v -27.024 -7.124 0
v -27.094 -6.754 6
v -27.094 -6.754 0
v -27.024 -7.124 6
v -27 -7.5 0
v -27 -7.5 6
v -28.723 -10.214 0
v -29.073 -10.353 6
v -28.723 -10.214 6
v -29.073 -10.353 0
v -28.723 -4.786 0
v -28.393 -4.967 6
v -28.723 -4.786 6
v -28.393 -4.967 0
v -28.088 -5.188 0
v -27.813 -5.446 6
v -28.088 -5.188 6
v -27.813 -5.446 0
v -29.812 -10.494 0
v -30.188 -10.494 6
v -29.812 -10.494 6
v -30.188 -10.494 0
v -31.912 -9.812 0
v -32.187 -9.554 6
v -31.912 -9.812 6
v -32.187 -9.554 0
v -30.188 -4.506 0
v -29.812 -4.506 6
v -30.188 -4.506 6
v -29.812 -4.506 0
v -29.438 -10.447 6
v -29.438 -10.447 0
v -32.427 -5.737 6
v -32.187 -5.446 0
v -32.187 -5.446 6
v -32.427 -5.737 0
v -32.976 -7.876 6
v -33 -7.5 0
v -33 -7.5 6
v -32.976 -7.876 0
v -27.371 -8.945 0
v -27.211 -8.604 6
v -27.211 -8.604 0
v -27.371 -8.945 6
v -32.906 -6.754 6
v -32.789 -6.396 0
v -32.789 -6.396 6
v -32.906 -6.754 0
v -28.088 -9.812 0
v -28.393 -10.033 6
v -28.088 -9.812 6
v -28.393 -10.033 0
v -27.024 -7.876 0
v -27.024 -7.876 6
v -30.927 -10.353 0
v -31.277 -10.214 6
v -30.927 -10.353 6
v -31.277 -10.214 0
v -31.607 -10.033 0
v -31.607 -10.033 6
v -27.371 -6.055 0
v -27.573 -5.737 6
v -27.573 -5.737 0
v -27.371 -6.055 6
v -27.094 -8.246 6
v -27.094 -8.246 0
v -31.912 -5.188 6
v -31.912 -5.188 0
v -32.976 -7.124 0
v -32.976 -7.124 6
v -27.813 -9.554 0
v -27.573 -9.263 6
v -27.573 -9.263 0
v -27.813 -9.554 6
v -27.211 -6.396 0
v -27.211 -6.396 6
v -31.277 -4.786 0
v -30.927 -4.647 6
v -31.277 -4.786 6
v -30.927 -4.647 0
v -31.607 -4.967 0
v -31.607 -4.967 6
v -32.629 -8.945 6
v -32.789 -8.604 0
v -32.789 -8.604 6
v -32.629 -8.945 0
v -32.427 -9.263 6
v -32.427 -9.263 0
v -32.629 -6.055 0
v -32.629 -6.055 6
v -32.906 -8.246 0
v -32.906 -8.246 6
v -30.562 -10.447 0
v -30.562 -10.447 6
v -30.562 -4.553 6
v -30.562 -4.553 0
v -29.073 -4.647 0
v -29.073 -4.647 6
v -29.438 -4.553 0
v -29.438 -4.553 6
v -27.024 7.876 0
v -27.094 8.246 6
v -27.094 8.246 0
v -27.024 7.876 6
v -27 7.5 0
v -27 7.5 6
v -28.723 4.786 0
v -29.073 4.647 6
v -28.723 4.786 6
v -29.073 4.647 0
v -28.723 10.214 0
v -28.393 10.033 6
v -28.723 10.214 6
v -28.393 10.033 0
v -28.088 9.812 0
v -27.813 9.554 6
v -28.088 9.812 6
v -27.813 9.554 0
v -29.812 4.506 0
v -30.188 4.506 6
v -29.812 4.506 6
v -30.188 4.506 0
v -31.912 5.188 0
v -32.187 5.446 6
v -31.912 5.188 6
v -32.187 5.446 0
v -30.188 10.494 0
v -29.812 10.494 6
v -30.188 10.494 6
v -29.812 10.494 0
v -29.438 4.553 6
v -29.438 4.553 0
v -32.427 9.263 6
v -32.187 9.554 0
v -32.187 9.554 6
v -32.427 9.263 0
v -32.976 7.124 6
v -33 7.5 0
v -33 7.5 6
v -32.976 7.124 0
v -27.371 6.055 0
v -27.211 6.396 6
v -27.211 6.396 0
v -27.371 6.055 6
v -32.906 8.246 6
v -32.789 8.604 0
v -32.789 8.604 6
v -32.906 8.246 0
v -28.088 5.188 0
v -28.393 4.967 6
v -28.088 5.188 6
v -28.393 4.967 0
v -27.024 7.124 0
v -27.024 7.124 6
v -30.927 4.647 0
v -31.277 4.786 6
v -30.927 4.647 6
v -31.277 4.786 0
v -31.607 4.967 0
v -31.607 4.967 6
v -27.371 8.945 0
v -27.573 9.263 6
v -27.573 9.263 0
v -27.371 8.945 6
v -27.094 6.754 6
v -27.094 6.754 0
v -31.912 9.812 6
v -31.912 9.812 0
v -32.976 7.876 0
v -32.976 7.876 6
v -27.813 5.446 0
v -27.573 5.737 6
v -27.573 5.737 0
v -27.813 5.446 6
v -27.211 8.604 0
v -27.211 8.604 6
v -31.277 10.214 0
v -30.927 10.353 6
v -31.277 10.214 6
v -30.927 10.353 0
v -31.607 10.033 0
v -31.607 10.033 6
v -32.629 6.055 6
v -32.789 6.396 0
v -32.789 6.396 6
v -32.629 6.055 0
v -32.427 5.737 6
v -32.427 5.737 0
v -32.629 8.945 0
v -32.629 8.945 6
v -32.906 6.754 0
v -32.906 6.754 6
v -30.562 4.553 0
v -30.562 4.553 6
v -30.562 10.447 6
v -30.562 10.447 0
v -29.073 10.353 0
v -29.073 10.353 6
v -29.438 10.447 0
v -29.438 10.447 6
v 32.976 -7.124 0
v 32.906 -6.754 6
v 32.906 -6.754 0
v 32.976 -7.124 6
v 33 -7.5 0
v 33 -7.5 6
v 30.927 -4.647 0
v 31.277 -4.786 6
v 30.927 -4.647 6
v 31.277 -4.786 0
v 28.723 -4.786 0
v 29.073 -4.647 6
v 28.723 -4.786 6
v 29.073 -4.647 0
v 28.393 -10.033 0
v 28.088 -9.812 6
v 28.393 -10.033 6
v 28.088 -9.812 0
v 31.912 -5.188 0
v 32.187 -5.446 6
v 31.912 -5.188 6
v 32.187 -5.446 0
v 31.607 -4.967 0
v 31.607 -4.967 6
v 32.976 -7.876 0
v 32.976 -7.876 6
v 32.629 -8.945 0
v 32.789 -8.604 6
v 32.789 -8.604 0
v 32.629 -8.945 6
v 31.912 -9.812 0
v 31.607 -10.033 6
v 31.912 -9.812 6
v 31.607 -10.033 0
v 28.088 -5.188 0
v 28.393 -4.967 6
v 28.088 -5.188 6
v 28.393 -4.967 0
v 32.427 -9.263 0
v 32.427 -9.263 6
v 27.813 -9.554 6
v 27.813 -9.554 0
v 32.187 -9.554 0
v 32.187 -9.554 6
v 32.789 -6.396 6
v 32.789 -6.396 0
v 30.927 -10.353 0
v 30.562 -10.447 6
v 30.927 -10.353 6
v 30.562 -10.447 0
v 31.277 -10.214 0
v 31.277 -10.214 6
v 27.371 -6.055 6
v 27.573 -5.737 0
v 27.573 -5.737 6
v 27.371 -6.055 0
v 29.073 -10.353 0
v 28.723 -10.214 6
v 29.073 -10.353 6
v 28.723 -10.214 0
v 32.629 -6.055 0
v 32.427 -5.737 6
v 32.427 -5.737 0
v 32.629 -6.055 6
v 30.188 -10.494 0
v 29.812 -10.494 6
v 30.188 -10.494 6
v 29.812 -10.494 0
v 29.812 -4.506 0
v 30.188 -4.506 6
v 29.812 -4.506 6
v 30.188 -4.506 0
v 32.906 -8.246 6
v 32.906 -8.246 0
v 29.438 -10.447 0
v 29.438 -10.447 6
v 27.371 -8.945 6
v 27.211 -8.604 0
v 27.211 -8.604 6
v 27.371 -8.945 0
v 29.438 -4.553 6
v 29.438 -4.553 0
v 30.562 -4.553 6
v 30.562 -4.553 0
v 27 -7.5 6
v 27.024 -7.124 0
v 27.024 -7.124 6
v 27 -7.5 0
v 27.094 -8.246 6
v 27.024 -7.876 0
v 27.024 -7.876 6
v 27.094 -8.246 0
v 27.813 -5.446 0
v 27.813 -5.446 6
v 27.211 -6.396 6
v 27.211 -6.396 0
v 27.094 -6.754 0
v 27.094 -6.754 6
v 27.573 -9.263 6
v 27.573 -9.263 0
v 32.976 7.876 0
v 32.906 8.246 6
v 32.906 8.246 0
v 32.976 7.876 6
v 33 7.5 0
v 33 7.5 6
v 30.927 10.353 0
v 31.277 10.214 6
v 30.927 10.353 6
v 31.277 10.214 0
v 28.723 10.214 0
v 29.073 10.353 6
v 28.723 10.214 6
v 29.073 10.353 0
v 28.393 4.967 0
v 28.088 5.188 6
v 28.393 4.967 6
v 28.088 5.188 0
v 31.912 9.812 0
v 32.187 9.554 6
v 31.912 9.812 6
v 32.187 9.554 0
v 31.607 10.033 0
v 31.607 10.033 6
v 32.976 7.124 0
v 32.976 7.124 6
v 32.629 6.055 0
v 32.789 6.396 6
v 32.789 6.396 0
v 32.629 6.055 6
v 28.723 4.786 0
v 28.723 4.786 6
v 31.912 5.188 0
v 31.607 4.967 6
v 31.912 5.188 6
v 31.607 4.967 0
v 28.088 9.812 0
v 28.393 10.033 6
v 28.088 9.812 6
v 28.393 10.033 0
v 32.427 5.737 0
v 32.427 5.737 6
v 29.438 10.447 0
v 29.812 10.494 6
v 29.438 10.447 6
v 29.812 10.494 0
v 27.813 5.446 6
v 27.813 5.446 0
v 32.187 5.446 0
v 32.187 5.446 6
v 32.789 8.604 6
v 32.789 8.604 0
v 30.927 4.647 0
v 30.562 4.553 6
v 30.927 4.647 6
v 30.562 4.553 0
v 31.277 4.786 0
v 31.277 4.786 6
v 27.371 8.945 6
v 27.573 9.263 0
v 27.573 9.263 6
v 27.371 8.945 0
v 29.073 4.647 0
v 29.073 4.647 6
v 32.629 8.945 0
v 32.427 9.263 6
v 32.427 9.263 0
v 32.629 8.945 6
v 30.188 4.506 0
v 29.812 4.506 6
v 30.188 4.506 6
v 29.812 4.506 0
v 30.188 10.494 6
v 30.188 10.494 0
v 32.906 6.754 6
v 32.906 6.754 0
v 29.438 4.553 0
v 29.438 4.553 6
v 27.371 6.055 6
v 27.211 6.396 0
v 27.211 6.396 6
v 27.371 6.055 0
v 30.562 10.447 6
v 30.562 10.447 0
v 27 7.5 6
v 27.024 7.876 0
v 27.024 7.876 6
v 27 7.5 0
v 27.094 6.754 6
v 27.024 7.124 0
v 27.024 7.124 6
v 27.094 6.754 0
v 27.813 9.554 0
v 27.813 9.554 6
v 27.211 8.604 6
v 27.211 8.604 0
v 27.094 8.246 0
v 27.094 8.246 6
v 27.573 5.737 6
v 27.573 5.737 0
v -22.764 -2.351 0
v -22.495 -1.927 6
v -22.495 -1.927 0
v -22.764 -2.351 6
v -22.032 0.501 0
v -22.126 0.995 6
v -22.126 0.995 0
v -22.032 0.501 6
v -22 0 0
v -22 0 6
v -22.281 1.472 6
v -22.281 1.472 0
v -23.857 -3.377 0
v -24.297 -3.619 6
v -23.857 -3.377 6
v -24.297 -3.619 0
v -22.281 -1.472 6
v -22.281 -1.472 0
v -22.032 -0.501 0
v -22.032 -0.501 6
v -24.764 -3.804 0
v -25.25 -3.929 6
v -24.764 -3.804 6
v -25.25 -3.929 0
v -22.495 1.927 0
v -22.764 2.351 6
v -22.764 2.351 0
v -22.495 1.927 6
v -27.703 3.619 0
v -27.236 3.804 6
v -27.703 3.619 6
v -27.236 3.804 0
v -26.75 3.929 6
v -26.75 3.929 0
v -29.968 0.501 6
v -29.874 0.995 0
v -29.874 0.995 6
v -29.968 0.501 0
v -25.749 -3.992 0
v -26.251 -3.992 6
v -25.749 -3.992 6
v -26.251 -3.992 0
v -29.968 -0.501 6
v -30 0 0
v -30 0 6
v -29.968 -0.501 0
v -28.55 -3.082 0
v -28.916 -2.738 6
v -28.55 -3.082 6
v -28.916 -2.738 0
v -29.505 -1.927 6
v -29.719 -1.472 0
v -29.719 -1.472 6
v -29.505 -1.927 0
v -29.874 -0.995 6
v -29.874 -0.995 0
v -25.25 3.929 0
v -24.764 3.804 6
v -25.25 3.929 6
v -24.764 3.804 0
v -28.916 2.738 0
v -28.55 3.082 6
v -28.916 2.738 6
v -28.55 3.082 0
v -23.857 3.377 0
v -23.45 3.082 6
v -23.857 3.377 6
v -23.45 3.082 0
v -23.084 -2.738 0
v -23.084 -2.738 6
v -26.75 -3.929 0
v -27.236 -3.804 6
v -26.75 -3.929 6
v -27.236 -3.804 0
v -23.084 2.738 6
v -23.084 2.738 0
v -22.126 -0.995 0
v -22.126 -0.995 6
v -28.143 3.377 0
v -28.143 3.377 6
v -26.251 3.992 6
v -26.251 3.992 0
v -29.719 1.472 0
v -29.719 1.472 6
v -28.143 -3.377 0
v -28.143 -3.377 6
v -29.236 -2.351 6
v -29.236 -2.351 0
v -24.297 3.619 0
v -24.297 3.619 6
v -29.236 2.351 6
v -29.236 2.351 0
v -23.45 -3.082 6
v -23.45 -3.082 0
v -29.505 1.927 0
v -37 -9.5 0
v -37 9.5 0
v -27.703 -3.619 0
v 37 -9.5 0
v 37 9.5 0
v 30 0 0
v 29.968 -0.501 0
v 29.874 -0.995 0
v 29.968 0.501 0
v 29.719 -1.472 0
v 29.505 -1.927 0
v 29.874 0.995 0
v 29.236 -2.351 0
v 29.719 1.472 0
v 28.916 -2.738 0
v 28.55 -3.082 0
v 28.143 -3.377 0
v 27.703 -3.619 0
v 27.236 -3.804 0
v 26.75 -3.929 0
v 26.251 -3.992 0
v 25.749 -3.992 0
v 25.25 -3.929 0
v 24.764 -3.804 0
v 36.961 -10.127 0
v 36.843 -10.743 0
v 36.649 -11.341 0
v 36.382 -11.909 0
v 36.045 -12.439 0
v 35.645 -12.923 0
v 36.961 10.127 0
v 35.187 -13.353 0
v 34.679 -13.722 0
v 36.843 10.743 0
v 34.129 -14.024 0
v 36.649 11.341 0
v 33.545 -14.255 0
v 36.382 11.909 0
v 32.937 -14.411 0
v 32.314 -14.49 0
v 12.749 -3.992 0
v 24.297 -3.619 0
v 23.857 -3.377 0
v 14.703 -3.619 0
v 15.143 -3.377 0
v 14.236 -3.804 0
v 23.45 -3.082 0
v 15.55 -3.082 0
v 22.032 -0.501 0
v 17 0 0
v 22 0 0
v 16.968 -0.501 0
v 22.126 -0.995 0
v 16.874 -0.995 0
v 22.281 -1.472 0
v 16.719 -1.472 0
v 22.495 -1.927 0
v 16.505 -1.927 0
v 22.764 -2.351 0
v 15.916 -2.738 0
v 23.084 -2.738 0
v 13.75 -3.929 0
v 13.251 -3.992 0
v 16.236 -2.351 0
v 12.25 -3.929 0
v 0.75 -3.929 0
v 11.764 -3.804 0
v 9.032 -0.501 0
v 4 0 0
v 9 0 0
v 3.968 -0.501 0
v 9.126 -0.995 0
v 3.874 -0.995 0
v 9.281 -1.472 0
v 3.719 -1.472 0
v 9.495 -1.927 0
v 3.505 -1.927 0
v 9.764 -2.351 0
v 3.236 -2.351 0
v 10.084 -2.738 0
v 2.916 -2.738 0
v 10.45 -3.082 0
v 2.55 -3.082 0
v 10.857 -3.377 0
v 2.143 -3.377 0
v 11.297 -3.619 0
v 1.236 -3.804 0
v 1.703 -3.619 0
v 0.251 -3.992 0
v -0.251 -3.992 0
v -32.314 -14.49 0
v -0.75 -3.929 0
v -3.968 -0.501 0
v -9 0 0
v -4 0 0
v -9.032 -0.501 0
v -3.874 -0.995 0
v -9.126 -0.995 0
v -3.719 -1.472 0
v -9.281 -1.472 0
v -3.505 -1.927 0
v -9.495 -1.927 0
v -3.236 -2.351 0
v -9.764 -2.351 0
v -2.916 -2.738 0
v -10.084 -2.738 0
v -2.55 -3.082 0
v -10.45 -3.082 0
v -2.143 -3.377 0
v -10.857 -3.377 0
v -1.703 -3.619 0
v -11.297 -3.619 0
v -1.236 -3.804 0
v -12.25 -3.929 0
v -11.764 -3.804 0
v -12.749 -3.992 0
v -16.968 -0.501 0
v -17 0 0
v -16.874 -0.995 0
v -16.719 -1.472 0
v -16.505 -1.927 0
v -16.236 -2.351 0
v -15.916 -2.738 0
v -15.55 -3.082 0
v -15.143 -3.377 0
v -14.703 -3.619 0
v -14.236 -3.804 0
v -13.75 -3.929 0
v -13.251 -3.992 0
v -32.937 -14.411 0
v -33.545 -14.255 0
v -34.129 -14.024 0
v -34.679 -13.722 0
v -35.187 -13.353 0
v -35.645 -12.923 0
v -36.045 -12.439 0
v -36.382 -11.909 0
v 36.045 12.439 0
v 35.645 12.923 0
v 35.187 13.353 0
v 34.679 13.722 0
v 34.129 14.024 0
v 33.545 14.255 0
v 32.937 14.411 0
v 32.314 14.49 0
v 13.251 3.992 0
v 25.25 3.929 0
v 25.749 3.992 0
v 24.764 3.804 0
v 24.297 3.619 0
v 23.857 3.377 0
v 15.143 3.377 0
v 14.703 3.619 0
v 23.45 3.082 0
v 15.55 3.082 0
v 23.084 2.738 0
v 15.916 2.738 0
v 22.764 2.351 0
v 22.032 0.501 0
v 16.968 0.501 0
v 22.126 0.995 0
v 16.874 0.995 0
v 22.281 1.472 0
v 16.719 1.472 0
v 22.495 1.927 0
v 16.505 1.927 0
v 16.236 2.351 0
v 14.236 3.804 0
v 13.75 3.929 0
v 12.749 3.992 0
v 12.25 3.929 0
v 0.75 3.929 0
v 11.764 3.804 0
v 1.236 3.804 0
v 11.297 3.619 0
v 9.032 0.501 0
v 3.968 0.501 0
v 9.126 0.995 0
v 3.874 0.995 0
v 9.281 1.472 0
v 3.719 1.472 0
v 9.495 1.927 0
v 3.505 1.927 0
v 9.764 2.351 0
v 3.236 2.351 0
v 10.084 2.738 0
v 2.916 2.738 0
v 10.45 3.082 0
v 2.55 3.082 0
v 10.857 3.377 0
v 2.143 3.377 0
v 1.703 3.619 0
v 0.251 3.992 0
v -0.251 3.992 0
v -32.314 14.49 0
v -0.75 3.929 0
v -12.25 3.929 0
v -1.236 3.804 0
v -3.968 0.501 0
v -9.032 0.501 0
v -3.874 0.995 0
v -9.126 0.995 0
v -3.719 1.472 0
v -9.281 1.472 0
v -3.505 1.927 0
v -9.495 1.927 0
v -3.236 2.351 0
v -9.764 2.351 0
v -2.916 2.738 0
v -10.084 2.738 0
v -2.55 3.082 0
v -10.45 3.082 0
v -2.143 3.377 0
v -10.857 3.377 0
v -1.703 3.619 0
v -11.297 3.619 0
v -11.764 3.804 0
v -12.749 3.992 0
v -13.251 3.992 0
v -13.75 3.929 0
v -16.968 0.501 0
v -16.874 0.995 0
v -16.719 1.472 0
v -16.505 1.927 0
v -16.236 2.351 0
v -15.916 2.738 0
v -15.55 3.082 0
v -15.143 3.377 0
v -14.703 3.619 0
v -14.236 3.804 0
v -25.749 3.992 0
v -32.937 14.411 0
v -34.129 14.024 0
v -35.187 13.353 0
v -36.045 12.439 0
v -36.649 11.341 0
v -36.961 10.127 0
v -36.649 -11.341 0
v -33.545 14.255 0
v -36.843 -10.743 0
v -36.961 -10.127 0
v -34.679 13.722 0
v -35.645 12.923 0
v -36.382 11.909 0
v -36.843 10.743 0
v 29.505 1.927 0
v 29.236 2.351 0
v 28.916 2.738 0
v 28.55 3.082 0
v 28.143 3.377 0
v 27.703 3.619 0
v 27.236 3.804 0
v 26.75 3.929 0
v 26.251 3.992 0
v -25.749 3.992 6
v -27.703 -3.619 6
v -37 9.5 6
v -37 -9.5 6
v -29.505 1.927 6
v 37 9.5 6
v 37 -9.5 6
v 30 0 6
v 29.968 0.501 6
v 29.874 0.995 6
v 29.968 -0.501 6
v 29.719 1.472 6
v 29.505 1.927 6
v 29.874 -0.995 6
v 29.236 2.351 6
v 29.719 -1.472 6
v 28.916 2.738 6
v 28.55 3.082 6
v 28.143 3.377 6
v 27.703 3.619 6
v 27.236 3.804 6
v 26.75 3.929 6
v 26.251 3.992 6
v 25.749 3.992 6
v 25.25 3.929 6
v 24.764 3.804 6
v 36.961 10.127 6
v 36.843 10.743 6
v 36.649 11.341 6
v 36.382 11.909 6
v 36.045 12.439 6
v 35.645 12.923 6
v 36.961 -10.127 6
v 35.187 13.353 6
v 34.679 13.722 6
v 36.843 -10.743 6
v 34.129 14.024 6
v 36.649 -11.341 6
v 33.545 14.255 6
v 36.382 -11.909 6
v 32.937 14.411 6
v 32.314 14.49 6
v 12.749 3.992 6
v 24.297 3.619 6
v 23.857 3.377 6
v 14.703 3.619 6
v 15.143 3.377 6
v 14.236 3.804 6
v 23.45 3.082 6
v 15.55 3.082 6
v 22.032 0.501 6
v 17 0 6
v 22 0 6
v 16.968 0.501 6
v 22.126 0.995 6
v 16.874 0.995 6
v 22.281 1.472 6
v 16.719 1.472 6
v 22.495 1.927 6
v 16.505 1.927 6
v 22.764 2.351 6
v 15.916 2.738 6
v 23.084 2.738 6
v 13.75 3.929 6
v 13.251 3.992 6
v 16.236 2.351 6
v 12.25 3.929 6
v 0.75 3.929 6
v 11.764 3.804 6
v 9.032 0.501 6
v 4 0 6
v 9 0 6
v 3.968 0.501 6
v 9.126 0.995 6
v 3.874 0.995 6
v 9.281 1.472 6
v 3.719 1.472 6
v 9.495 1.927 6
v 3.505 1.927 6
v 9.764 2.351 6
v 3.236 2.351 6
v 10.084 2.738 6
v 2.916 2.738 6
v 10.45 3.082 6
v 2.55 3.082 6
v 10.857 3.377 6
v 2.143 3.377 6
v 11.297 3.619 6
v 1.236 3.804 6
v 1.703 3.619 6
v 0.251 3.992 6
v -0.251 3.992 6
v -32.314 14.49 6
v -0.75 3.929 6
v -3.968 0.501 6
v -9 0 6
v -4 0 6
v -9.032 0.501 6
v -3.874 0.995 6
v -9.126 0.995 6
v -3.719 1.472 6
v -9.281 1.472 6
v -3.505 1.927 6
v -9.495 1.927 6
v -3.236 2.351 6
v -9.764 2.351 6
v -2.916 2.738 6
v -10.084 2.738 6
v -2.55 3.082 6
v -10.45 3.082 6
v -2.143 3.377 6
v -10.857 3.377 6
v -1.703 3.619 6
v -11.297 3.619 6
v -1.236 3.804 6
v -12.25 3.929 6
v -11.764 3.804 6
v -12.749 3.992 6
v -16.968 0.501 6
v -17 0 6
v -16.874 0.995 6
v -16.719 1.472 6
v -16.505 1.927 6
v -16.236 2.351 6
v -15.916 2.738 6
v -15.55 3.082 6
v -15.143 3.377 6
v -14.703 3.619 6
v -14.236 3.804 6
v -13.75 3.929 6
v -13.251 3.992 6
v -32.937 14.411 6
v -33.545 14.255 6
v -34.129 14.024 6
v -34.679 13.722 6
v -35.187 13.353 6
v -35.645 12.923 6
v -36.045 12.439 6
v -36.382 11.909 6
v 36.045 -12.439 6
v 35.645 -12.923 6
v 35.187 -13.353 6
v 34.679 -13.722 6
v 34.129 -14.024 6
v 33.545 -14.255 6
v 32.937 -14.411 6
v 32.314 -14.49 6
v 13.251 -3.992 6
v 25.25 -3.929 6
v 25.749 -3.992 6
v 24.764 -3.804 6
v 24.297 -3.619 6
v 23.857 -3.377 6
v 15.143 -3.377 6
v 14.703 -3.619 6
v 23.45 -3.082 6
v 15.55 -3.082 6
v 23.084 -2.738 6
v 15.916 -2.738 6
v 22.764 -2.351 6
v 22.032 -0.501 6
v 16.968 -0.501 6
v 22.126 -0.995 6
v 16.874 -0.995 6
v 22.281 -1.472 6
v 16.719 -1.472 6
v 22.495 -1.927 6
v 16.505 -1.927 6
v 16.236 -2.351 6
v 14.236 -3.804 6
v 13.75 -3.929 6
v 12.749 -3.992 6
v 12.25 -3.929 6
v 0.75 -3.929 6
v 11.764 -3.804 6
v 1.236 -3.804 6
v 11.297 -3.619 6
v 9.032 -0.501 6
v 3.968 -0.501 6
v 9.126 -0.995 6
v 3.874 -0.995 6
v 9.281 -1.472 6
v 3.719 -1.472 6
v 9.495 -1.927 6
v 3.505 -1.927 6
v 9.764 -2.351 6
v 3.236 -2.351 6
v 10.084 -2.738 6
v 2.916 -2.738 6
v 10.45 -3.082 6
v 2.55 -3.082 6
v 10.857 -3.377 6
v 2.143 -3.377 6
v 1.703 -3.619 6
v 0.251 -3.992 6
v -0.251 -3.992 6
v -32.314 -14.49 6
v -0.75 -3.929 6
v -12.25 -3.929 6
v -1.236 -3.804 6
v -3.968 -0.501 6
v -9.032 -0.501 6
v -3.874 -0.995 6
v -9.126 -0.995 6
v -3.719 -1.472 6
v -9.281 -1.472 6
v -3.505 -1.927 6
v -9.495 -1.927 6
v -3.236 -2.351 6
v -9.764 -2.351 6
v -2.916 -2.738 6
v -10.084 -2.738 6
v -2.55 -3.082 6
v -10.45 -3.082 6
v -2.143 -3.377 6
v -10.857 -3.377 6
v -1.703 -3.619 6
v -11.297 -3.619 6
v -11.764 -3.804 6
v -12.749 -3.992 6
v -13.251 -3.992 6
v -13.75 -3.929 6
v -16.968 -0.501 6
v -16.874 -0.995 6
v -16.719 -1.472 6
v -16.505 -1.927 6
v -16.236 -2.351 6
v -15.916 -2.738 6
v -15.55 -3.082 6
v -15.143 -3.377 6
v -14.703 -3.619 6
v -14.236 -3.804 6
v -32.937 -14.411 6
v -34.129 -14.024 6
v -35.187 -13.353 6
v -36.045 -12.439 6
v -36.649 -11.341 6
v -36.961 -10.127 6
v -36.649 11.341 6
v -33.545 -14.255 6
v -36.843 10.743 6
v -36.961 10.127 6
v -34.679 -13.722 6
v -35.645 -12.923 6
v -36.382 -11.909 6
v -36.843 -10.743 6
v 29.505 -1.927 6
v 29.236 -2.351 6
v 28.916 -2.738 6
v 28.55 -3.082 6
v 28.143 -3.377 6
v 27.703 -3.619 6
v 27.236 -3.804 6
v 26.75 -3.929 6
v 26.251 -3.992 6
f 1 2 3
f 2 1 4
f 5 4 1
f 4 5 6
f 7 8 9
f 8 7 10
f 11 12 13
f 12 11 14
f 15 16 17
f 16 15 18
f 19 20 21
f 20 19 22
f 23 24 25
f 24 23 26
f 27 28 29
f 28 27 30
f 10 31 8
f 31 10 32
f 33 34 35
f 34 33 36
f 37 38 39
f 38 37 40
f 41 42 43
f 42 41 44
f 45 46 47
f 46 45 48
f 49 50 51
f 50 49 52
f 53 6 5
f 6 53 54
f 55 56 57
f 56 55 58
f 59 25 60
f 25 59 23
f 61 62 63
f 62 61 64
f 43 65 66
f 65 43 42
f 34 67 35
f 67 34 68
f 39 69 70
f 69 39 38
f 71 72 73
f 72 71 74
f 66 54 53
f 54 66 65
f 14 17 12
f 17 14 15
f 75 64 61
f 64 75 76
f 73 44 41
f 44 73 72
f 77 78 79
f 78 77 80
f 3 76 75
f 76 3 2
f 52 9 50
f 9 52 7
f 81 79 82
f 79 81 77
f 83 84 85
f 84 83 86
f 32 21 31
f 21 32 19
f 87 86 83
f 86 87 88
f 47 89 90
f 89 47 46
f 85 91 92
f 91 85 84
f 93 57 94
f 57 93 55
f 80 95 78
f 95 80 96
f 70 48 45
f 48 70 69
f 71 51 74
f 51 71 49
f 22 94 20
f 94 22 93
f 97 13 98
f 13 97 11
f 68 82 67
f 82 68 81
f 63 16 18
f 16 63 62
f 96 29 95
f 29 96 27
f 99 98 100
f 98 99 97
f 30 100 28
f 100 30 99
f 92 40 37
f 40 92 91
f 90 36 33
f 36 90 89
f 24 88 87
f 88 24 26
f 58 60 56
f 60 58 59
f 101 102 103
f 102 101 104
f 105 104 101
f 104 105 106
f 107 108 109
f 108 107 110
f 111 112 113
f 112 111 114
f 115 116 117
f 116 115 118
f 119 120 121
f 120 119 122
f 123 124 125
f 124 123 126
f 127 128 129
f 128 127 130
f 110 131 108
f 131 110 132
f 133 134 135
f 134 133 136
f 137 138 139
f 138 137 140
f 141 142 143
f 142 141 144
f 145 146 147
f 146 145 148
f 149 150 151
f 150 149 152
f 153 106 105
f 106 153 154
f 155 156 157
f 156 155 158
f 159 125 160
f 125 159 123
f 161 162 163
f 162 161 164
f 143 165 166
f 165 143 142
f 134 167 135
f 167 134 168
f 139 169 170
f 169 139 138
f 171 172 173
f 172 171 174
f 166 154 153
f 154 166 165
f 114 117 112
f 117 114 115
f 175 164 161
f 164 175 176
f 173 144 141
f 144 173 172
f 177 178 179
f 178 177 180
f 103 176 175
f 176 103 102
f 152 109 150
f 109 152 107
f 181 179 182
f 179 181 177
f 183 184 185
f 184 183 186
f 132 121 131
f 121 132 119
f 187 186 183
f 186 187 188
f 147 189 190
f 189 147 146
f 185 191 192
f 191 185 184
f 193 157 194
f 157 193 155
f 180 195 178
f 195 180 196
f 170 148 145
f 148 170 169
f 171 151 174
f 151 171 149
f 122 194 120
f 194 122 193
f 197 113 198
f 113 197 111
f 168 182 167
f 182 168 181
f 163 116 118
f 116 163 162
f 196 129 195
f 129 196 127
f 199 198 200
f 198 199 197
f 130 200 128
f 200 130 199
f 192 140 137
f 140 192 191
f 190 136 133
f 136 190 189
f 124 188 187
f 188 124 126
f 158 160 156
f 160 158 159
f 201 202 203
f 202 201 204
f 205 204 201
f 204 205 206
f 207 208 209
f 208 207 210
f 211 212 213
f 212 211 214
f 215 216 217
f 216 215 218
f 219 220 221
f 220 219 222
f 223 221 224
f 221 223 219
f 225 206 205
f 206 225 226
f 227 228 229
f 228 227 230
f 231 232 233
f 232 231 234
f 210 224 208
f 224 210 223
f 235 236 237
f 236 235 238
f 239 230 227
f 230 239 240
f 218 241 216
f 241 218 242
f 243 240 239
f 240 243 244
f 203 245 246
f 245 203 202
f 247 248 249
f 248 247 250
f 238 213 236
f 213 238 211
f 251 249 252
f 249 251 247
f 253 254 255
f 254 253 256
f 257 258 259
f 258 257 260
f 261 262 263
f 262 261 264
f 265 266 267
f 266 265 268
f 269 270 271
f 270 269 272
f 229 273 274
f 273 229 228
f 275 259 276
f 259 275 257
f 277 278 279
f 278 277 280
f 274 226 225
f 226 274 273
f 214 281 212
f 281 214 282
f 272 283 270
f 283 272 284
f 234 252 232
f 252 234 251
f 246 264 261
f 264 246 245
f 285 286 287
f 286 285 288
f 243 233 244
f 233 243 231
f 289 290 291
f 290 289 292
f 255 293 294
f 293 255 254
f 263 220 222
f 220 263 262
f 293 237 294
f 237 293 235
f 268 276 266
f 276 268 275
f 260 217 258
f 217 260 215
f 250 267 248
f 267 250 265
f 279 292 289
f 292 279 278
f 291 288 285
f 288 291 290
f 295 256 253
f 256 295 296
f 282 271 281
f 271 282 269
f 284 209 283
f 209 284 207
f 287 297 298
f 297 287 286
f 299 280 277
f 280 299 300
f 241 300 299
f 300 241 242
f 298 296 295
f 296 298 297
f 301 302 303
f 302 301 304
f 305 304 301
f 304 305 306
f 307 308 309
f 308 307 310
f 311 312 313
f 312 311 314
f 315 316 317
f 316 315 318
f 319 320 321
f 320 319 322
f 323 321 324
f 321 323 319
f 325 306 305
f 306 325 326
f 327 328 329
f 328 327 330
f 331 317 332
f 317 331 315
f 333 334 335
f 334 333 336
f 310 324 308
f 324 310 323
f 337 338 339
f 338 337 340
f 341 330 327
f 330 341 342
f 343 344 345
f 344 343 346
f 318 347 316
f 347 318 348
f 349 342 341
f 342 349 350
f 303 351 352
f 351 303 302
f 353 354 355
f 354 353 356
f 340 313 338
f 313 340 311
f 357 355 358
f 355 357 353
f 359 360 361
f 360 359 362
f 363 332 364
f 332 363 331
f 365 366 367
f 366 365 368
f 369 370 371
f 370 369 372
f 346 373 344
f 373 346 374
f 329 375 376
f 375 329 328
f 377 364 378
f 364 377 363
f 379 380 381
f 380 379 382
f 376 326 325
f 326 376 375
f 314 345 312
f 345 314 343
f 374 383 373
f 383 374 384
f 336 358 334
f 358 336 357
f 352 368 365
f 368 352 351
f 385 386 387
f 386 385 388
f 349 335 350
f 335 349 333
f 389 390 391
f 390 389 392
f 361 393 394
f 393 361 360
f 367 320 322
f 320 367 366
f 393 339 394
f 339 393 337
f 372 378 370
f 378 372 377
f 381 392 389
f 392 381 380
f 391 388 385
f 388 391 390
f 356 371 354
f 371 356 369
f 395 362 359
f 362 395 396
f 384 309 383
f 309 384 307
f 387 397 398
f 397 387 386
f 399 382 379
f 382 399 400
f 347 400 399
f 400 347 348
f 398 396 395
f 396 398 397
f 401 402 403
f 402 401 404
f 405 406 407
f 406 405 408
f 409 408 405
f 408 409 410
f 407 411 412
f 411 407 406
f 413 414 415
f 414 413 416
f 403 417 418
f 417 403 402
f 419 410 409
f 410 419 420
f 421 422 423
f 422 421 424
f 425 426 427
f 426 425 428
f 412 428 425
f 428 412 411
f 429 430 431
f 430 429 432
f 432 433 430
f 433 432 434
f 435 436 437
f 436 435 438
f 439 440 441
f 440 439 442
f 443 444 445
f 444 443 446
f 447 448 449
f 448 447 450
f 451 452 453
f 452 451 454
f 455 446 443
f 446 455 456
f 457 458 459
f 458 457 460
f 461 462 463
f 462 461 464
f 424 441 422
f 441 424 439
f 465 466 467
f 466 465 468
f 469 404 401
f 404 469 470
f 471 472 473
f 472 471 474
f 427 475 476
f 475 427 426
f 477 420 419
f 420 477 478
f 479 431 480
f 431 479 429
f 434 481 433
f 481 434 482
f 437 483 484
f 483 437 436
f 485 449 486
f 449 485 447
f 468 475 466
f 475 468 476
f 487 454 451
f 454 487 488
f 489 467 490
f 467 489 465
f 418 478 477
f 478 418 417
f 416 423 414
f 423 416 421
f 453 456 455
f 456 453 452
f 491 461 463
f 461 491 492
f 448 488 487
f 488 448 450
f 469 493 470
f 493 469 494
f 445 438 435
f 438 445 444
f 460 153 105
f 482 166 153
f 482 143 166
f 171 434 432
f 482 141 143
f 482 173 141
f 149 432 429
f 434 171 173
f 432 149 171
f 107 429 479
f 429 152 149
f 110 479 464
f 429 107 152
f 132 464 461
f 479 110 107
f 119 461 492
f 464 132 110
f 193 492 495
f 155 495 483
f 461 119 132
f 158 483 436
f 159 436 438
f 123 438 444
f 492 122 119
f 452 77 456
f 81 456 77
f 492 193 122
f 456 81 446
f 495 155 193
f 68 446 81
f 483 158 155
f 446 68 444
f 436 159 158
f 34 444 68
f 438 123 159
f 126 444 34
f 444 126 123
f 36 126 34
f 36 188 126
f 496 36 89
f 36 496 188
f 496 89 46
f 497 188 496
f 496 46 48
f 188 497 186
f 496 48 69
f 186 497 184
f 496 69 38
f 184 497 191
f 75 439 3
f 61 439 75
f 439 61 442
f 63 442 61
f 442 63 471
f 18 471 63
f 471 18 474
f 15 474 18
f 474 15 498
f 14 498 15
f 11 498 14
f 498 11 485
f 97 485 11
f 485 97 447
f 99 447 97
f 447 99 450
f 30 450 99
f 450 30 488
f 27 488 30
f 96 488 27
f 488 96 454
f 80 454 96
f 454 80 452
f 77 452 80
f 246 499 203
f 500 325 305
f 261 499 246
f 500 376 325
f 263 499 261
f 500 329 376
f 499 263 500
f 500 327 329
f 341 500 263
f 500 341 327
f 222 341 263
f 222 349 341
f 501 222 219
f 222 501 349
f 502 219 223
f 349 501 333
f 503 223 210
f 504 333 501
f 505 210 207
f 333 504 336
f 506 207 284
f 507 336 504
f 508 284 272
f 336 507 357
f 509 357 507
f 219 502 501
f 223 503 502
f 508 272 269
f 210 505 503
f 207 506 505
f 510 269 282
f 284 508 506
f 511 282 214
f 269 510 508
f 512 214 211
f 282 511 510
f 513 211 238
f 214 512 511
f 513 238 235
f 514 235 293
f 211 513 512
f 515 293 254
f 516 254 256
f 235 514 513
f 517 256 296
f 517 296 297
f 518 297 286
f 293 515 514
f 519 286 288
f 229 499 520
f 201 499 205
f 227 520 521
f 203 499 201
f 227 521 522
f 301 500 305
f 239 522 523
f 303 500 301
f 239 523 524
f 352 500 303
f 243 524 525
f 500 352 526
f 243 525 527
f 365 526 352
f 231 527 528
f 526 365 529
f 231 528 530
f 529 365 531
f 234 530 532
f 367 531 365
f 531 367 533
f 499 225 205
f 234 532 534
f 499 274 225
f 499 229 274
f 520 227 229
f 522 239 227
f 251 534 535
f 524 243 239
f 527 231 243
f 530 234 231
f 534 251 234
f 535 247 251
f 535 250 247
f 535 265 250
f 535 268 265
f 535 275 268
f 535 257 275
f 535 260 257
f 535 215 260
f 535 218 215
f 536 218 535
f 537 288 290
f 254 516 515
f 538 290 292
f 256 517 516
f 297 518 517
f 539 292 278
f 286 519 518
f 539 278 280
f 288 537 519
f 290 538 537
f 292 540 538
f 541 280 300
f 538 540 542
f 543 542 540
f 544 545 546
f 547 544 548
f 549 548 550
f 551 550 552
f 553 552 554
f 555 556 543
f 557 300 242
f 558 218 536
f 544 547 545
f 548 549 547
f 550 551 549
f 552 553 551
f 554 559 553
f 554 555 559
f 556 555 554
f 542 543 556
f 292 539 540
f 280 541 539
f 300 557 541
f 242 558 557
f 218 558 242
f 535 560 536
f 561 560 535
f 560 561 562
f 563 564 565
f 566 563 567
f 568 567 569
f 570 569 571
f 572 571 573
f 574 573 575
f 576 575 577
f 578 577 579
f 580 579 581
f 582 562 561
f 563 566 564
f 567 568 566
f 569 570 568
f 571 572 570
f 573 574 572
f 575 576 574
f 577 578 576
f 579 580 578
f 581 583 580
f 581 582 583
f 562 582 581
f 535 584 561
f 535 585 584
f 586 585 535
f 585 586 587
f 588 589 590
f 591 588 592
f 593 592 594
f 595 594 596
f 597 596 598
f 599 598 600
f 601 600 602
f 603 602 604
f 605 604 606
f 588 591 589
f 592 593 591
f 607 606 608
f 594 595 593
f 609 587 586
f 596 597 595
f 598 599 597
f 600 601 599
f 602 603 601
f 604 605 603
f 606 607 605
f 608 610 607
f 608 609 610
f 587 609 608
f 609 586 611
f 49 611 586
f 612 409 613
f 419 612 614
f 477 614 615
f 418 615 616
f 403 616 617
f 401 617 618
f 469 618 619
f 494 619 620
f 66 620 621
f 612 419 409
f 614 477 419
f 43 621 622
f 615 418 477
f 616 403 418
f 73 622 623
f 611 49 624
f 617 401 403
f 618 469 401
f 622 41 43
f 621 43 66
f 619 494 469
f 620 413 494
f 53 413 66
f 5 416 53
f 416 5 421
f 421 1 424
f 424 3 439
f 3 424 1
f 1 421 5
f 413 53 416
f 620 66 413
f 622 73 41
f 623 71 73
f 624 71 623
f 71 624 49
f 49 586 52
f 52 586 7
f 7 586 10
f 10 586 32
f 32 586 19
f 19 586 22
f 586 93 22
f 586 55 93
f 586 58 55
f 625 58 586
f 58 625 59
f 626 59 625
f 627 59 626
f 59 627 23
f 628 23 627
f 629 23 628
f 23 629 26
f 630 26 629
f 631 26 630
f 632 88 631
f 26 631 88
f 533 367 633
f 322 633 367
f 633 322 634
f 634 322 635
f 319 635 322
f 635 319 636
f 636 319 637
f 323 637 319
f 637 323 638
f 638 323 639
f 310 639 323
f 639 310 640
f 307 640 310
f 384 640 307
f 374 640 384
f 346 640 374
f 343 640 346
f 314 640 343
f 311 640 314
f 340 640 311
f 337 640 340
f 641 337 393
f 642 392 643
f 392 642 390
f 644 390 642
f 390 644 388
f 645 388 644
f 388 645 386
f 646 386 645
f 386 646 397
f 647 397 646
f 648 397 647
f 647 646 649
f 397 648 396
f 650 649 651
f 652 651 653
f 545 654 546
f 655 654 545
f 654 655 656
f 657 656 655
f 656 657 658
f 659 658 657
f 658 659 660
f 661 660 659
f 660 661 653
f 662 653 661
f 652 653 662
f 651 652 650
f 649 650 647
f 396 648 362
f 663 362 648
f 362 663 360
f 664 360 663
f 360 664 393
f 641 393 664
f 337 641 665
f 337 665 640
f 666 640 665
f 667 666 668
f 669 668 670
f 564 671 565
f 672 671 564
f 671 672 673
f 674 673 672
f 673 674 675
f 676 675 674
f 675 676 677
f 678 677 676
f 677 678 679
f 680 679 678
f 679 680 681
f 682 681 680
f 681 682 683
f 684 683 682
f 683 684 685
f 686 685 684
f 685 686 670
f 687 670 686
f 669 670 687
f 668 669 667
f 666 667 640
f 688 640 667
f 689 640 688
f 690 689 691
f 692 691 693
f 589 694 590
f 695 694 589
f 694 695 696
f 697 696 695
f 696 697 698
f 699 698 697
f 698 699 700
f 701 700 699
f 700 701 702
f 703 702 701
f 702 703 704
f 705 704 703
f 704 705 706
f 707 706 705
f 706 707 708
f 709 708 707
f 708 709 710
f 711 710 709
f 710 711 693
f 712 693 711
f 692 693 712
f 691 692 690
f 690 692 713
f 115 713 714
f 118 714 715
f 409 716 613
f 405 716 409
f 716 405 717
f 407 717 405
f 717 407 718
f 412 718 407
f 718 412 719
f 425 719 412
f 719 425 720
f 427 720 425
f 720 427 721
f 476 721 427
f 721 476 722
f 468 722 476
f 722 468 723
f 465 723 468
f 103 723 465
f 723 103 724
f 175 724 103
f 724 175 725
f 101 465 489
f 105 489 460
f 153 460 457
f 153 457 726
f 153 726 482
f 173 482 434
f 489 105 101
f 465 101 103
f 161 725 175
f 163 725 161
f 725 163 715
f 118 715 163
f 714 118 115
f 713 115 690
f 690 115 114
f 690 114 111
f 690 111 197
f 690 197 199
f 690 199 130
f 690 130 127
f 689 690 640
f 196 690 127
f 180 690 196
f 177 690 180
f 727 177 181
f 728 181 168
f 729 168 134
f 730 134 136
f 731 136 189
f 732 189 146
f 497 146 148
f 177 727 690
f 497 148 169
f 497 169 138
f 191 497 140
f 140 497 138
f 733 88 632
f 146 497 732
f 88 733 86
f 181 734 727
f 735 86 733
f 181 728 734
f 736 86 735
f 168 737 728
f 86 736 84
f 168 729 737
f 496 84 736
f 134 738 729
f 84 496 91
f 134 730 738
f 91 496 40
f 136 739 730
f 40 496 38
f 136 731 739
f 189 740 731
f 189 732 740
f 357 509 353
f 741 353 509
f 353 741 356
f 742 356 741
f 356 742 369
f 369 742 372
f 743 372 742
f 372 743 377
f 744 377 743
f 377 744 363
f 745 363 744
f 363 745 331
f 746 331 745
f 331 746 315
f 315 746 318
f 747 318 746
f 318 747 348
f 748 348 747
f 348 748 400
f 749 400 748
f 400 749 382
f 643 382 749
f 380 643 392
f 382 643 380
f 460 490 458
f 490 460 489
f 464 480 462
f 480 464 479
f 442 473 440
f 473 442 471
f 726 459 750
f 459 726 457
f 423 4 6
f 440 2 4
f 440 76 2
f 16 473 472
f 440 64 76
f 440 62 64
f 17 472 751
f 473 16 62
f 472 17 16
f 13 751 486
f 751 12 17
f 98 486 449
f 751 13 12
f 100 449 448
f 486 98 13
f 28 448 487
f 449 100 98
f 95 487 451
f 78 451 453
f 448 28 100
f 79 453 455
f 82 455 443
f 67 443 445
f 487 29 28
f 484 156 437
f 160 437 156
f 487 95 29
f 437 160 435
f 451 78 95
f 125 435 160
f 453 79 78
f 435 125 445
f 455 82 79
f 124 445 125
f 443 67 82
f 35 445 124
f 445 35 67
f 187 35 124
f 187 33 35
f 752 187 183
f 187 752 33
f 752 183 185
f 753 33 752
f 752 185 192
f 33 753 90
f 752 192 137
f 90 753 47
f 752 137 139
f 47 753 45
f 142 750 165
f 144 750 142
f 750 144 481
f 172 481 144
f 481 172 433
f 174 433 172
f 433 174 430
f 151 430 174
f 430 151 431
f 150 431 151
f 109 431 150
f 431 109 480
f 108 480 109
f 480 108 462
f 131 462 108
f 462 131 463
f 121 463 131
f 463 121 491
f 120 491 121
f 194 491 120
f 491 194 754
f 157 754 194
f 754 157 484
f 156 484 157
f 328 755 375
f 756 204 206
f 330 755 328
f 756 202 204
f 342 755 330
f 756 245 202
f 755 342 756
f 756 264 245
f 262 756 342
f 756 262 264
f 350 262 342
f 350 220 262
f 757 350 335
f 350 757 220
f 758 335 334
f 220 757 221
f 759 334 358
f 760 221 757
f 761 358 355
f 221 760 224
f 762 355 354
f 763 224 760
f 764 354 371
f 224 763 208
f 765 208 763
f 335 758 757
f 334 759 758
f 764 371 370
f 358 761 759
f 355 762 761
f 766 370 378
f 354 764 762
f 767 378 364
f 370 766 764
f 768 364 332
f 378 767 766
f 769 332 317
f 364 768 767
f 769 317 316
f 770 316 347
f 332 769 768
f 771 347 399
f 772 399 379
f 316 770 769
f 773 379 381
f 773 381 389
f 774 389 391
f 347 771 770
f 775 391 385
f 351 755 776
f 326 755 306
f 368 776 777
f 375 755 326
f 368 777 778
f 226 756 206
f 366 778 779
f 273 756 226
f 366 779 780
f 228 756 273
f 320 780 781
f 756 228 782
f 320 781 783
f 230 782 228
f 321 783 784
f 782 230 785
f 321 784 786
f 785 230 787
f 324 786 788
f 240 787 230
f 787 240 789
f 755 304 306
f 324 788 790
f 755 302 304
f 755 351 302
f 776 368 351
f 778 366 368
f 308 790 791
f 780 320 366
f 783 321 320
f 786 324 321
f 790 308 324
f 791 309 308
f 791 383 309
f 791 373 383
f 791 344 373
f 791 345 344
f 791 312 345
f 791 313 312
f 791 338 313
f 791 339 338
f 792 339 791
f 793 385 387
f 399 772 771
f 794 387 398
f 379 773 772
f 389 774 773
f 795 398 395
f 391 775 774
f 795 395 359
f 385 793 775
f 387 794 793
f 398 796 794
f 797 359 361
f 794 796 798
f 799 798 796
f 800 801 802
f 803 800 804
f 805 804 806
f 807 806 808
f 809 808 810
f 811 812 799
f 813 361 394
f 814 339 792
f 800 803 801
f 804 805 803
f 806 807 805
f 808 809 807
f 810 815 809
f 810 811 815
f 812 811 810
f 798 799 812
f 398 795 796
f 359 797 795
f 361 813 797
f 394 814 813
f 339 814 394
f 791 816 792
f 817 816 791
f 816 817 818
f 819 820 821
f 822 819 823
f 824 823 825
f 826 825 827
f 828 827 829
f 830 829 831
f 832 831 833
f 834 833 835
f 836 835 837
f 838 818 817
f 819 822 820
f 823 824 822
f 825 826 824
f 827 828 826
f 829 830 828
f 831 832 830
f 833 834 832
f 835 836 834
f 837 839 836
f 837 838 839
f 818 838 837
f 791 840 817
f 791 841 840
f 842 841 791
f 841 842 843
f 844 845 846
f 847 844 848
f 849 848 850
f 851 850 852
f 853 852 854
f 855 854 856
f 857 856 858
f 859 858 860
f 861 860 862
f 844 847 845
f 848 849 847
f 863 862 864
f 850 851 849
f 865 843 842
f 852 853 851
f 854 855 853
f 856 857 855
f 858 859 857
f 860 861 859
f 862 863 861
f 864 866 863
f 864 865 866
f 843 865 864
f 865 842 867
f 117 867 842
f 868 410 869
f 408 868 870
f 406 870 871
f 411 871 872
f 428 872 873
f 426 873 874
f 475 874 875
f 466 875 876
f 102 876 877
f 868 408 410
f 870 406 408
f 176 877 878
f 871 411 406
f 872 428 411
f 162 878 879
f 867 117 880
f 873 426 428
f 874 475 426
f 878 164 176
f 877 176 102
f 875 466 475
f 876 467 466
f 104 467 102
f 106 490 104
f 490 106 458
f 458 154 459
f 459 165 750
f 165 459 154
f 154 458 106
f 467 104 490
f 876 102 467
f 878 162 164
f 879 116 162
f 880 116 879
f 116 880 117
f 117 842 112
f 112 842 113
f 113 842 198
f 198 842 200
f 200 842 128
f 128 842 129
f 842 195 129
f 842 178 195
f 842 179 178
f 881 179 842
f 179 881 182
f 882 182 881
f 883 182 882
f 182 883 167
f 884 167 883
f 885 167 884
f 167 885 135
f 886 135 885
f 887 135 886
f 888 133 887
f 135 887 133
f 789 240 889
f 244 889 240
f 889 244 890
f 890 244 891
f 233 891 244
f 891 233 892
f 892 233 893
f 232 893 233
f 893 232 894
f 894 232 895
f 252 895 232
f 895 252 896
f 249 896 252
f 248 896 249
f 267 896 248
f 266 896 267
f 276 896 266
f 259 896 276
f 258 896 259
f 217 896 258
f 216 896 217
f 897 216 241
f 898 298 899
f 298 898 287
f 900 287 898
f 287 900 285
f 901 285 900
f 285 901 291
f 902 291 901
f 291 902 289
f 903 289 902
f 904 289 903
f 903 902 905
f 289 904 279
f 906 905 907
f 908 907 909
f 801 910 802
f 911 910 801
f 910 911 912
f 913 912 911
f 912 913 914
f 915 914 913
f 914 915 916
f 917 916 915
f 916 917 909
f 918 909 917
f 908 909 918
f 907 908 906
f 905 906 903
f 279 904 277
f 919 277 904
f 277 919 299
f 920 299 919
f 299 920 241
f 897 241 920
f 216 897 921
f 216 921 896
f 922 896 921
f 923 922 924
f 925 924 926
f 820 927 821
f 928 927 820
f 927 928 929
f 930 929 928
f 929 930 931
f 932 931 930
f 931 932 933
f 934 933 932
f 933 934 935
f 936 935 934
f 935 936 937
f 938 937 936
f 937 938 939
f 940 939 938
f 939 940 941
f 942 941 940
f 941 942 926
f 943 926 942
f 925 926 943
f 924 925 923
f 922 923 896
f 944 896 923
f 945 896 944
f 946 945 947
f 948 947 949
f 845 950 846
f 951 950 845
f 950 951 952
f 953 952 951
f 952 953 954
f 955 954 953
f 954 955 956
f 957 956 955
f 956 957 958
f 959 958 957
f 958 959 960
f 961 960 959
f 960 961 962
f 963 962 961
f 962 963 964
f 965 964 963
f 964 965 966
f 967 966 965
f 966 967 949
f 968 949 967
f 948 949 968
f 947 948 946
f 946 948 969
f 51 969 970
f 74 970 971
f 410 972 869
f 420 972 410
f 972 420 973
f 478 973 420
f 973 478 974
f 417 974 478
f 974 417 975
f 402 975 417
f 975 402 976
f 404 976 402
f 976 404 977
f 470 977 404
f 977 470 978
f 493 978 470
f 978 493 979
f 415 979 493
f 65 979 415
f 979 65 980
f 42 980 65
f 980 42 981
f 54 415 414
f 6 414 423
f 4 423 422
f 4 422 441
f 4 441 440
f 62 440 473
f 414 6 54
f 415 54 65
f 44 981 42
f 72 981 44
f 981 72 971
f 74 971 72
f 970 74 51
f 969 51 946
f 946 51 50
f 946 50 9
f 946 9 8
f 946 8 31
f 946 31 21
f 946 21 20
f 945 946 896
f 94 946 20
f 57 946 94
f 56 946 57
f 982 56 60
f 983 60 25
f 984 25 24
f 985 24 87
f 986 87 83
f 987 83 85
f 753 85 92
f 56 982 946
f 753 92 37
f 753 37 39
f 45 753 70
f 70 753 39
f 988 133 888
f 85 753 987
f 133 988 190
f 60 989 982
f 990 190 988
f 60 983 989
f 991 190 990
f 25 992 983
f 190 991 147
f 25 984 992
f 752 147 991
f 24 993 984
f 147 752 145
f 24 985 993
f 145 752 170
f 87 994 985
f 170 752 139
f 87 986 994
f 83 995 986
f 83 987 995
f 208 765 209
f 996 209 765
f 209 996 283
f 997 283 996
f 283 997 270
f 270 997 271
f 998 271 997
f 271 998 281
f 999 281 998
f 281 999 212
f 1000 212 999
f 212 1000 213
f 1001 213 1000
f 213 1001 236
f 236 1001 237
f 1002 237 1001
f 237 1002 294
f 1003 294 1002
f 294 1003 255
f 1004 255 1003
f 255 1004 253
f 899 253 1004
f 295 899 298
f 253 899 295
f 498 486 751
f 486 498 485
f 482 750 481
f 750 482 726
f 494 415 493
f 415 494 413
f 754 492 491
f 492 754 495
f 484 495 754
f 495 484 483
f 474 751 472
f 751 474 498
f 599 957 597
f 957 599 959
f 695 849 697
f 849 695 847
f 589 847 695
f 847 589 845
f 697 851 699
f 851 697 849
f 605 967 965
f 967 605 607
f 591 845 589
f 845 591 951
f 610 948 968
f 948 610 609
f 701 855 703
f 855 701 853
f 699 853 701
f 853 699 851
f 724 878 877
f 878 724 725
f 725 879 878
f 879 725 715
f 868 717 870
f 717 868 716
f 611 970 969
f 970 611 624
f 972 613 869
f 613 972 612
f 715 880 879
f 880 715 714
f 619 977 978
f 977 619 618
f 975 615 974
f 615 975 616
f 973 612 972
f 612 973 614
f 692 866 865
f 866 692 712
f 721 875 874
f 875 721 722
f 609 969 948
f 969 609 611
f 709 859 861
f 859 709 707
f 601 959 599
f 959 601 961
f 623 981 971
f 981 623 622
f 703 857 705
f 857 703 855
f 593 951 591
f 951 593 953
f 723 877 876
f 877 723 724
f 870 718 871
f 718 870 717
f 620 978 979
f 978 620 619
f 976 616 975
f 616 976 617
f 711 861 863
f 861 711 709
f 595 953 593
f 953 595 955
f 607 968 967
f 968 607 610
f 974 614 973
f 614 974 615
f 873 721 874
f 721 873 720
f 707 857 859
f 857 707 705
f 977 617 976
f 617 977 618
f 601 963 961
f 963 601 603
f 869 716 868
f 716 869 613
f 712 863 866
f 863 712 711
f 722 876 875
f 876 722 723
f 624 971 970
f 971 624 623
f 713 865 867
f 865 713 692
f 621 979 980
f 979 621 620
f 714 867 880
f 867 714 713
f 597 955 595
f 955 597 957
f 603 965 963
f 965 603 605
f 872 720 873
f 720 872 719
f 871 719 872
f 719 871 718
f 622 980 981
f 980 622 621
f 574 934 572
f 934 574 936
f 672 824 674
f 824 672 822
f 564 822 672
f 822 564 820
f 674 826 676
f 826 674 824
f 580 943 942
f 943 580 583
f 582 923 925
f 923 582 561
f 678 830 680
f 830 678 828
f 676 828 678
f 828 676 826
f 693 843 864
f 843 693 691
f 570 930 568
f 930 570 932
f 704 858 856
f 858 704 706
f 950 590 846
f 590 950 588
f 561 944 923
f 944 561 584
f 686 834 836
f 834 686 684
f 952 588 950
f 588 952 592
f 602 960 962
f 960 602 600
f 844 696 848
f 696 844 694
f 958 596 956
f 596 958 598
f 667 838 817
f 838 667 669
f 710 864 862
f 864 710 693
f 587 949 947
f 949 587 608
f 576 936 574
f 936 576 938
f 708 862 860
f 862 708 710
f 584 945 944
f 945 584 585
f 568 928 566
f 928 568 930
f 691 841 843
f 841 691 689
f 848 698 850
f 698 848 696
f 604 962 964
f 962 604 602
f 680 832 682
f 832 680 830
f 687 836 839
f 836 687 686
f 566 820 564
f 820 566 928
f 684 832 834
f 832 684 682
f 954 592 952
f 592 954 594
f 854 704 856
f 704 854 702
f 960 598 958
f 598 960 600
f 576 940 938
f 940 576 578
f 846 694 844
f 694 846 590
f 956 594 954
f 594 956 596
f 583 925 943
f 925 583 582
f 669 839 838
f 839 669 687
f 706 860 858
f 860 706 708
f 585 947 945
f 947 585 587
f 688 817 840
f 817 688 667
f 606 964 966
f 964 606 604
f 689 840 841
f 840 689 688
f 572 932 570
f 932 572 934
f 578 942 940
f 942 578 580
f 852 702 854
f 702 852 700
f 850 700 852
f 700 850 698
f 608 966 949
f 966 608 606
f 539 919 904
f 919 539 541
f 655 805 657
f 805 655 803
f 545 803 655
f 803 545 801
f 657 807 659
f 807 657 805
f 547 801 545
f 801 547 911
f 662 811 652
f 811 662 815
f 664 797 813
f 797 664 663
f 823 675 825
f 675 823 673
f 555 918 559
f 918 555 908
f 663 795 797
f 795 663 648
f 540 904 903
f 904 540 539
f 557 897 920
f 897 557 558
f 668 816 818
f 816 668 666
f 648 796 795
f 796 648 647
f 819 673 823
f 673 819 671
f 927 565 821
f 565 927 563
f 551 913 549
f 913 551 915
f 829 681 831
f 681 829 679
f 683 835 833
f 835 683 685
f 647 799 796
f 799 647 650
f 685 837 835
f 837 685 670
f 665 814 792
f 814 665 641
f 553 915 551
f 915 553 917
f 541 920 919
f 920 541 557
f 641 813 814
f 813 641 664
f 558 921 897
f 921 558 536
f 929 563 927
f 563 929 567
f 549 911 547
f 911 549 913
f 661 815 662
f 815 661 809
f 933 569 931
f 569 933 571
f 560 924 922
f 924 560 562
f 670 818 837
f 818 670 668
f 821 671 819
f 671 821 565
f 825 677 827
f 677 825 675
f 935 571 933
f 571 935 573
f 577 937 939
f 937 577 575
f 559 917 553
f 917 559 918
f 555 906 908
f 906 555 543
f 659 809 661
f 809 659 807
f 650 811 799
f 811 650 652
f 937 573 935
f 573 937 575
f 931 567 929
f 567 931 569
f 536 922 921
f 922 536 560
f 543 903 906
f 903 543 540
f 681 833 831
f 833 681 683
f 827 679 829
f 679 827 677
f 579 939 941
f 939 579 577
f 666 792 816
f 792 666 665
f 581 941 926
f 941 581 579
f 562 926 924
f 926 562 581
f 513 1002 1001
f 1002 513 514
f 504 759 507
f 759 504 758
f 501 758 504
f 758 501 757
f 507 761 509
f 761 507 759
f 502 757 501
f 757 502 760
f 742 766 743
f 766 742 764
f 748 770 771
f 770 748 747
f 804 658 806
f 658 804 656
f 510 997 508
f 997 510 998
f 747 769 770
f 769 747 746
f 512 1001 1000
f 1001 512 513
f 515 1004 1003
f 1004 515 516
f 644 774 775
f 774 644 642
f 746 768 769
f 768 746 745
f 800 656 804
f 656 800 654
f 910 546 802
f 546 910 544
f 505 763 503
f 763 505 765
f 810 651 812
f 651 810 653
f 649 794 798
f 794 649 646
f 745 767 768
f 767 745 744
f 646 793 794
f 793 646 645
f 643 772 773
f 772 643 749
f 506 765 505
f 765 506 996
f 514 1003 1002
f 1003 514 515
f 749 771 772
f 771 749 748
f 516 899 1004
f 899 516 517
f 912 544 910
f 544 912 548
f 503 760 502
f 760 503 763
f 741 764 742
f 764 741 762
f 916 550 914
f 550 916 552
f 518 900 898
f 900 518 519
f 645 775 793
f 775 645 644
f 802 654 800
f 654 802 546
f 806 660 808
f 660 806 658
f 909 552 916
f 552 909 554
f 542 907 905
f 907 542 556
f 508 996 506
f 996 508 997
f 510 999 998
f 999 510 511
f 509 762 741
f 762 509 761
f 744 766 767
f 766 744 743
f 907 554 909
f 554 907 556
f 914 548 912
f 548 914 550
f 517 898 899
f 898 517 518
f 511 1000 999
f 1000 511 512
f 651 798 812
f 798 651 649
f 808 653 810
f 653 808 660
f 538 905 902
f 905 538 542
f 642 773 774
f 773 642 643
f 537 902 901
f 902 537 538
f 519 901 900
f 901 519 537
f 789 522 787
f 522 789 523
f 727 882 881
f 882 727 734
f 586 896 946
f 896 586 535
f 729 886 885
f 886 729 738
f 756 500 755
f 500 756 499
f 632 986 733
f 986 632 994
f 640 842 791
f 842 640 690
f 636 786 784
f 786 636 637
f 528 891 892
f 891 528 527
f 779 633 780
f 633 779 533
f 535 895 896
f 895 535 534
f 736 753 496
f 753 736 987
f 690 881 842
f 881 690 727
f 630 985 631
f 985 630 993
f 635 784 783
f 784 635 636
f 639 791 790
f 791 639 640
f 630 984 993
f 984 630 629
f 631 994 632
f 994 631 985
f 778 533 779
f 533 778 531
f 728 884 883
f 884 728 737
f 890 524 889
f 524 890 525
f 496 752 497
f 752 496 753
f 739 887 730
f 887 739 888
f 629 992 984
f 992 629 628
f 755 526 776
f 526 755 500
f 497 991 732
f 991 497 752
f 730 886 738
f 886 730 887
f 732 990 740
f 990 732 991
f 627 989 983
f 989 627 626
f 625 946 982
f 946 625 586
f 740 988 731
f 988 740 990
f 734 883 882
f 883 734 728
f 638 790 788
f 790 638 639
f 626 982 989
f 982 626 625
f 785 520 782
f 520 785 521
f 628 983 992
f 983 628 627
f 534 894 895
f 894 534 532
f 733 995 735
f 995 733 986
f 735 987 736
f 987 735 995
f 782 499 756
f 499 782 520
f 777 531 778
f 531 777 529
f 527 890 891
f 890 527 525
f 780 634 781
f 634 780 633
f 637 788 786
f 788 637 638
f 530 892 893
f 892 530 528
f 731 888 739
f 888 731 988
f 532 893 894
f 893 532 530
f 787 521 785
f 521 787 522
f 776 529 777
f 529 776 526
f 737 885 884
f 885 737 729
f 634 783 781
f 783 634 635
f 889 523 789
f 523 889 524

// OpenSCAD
$fn = 50;


difference() {
	union() {
		hull() {
			translate(v = [-32.0000000000, 9.5000000000, 0]) {
				cylinder(h = 6, r = 5);
			}
			translate(v = [32.0000000000, 9.5000000000, 0]) {
				cylinder(h = 6, r = 5);
			}
			translate(v = [-32.0000000000, -9.5000000000, 0]) {
				cylinder(h = 6, r = 5);
			}
			translate(v = [32.0000000000, -9.5000000000, 0]) {
				cylinder(h = 6, r = 5);
			}
		}
	}
	union() {
		#translate(v = [-30.0000000000, -7.5000000000, -100.0000000000]) {
			cylinder(h = 200, r = 3.0000000000);
		}
		#translate(v = [-30.0000000000, 7.5000000000, -100.0000000000]) {
			cylinder(h = 200, r = 3.0000000000);
		}
		#translate(v = [30.0000000000, -7.5000000000, -100.0000000000]) {
			cylinder(h = 200, r = 3.0000000000);
		}
		#translate(v = [30.0000000000, 7.5000000000, -100.0000000000]) {
			cylinder(h = 200, r = 3.0000000000);
		}
		#translate(v = [-26.0000000000, 0, 0]) {
			cylinder(h = 6, r = 4.0000000000);
		}
		#translate(v = [-13.0000000000, 0, 0]) {
			cylinder(h = 6, r = 4.0000000000);
		}
		#cylinder(h = 6, r = 4.0000000000);
		#translate(v = [13.0000000000, 0, 0]) {
			cylinder(h = 6, r = 4.0000000000);
		}
		#translate(v = [26.0000000000, 0, 0]) {
			cylinder(h = 6, r = 4.0000000000);
		}
	}
}
